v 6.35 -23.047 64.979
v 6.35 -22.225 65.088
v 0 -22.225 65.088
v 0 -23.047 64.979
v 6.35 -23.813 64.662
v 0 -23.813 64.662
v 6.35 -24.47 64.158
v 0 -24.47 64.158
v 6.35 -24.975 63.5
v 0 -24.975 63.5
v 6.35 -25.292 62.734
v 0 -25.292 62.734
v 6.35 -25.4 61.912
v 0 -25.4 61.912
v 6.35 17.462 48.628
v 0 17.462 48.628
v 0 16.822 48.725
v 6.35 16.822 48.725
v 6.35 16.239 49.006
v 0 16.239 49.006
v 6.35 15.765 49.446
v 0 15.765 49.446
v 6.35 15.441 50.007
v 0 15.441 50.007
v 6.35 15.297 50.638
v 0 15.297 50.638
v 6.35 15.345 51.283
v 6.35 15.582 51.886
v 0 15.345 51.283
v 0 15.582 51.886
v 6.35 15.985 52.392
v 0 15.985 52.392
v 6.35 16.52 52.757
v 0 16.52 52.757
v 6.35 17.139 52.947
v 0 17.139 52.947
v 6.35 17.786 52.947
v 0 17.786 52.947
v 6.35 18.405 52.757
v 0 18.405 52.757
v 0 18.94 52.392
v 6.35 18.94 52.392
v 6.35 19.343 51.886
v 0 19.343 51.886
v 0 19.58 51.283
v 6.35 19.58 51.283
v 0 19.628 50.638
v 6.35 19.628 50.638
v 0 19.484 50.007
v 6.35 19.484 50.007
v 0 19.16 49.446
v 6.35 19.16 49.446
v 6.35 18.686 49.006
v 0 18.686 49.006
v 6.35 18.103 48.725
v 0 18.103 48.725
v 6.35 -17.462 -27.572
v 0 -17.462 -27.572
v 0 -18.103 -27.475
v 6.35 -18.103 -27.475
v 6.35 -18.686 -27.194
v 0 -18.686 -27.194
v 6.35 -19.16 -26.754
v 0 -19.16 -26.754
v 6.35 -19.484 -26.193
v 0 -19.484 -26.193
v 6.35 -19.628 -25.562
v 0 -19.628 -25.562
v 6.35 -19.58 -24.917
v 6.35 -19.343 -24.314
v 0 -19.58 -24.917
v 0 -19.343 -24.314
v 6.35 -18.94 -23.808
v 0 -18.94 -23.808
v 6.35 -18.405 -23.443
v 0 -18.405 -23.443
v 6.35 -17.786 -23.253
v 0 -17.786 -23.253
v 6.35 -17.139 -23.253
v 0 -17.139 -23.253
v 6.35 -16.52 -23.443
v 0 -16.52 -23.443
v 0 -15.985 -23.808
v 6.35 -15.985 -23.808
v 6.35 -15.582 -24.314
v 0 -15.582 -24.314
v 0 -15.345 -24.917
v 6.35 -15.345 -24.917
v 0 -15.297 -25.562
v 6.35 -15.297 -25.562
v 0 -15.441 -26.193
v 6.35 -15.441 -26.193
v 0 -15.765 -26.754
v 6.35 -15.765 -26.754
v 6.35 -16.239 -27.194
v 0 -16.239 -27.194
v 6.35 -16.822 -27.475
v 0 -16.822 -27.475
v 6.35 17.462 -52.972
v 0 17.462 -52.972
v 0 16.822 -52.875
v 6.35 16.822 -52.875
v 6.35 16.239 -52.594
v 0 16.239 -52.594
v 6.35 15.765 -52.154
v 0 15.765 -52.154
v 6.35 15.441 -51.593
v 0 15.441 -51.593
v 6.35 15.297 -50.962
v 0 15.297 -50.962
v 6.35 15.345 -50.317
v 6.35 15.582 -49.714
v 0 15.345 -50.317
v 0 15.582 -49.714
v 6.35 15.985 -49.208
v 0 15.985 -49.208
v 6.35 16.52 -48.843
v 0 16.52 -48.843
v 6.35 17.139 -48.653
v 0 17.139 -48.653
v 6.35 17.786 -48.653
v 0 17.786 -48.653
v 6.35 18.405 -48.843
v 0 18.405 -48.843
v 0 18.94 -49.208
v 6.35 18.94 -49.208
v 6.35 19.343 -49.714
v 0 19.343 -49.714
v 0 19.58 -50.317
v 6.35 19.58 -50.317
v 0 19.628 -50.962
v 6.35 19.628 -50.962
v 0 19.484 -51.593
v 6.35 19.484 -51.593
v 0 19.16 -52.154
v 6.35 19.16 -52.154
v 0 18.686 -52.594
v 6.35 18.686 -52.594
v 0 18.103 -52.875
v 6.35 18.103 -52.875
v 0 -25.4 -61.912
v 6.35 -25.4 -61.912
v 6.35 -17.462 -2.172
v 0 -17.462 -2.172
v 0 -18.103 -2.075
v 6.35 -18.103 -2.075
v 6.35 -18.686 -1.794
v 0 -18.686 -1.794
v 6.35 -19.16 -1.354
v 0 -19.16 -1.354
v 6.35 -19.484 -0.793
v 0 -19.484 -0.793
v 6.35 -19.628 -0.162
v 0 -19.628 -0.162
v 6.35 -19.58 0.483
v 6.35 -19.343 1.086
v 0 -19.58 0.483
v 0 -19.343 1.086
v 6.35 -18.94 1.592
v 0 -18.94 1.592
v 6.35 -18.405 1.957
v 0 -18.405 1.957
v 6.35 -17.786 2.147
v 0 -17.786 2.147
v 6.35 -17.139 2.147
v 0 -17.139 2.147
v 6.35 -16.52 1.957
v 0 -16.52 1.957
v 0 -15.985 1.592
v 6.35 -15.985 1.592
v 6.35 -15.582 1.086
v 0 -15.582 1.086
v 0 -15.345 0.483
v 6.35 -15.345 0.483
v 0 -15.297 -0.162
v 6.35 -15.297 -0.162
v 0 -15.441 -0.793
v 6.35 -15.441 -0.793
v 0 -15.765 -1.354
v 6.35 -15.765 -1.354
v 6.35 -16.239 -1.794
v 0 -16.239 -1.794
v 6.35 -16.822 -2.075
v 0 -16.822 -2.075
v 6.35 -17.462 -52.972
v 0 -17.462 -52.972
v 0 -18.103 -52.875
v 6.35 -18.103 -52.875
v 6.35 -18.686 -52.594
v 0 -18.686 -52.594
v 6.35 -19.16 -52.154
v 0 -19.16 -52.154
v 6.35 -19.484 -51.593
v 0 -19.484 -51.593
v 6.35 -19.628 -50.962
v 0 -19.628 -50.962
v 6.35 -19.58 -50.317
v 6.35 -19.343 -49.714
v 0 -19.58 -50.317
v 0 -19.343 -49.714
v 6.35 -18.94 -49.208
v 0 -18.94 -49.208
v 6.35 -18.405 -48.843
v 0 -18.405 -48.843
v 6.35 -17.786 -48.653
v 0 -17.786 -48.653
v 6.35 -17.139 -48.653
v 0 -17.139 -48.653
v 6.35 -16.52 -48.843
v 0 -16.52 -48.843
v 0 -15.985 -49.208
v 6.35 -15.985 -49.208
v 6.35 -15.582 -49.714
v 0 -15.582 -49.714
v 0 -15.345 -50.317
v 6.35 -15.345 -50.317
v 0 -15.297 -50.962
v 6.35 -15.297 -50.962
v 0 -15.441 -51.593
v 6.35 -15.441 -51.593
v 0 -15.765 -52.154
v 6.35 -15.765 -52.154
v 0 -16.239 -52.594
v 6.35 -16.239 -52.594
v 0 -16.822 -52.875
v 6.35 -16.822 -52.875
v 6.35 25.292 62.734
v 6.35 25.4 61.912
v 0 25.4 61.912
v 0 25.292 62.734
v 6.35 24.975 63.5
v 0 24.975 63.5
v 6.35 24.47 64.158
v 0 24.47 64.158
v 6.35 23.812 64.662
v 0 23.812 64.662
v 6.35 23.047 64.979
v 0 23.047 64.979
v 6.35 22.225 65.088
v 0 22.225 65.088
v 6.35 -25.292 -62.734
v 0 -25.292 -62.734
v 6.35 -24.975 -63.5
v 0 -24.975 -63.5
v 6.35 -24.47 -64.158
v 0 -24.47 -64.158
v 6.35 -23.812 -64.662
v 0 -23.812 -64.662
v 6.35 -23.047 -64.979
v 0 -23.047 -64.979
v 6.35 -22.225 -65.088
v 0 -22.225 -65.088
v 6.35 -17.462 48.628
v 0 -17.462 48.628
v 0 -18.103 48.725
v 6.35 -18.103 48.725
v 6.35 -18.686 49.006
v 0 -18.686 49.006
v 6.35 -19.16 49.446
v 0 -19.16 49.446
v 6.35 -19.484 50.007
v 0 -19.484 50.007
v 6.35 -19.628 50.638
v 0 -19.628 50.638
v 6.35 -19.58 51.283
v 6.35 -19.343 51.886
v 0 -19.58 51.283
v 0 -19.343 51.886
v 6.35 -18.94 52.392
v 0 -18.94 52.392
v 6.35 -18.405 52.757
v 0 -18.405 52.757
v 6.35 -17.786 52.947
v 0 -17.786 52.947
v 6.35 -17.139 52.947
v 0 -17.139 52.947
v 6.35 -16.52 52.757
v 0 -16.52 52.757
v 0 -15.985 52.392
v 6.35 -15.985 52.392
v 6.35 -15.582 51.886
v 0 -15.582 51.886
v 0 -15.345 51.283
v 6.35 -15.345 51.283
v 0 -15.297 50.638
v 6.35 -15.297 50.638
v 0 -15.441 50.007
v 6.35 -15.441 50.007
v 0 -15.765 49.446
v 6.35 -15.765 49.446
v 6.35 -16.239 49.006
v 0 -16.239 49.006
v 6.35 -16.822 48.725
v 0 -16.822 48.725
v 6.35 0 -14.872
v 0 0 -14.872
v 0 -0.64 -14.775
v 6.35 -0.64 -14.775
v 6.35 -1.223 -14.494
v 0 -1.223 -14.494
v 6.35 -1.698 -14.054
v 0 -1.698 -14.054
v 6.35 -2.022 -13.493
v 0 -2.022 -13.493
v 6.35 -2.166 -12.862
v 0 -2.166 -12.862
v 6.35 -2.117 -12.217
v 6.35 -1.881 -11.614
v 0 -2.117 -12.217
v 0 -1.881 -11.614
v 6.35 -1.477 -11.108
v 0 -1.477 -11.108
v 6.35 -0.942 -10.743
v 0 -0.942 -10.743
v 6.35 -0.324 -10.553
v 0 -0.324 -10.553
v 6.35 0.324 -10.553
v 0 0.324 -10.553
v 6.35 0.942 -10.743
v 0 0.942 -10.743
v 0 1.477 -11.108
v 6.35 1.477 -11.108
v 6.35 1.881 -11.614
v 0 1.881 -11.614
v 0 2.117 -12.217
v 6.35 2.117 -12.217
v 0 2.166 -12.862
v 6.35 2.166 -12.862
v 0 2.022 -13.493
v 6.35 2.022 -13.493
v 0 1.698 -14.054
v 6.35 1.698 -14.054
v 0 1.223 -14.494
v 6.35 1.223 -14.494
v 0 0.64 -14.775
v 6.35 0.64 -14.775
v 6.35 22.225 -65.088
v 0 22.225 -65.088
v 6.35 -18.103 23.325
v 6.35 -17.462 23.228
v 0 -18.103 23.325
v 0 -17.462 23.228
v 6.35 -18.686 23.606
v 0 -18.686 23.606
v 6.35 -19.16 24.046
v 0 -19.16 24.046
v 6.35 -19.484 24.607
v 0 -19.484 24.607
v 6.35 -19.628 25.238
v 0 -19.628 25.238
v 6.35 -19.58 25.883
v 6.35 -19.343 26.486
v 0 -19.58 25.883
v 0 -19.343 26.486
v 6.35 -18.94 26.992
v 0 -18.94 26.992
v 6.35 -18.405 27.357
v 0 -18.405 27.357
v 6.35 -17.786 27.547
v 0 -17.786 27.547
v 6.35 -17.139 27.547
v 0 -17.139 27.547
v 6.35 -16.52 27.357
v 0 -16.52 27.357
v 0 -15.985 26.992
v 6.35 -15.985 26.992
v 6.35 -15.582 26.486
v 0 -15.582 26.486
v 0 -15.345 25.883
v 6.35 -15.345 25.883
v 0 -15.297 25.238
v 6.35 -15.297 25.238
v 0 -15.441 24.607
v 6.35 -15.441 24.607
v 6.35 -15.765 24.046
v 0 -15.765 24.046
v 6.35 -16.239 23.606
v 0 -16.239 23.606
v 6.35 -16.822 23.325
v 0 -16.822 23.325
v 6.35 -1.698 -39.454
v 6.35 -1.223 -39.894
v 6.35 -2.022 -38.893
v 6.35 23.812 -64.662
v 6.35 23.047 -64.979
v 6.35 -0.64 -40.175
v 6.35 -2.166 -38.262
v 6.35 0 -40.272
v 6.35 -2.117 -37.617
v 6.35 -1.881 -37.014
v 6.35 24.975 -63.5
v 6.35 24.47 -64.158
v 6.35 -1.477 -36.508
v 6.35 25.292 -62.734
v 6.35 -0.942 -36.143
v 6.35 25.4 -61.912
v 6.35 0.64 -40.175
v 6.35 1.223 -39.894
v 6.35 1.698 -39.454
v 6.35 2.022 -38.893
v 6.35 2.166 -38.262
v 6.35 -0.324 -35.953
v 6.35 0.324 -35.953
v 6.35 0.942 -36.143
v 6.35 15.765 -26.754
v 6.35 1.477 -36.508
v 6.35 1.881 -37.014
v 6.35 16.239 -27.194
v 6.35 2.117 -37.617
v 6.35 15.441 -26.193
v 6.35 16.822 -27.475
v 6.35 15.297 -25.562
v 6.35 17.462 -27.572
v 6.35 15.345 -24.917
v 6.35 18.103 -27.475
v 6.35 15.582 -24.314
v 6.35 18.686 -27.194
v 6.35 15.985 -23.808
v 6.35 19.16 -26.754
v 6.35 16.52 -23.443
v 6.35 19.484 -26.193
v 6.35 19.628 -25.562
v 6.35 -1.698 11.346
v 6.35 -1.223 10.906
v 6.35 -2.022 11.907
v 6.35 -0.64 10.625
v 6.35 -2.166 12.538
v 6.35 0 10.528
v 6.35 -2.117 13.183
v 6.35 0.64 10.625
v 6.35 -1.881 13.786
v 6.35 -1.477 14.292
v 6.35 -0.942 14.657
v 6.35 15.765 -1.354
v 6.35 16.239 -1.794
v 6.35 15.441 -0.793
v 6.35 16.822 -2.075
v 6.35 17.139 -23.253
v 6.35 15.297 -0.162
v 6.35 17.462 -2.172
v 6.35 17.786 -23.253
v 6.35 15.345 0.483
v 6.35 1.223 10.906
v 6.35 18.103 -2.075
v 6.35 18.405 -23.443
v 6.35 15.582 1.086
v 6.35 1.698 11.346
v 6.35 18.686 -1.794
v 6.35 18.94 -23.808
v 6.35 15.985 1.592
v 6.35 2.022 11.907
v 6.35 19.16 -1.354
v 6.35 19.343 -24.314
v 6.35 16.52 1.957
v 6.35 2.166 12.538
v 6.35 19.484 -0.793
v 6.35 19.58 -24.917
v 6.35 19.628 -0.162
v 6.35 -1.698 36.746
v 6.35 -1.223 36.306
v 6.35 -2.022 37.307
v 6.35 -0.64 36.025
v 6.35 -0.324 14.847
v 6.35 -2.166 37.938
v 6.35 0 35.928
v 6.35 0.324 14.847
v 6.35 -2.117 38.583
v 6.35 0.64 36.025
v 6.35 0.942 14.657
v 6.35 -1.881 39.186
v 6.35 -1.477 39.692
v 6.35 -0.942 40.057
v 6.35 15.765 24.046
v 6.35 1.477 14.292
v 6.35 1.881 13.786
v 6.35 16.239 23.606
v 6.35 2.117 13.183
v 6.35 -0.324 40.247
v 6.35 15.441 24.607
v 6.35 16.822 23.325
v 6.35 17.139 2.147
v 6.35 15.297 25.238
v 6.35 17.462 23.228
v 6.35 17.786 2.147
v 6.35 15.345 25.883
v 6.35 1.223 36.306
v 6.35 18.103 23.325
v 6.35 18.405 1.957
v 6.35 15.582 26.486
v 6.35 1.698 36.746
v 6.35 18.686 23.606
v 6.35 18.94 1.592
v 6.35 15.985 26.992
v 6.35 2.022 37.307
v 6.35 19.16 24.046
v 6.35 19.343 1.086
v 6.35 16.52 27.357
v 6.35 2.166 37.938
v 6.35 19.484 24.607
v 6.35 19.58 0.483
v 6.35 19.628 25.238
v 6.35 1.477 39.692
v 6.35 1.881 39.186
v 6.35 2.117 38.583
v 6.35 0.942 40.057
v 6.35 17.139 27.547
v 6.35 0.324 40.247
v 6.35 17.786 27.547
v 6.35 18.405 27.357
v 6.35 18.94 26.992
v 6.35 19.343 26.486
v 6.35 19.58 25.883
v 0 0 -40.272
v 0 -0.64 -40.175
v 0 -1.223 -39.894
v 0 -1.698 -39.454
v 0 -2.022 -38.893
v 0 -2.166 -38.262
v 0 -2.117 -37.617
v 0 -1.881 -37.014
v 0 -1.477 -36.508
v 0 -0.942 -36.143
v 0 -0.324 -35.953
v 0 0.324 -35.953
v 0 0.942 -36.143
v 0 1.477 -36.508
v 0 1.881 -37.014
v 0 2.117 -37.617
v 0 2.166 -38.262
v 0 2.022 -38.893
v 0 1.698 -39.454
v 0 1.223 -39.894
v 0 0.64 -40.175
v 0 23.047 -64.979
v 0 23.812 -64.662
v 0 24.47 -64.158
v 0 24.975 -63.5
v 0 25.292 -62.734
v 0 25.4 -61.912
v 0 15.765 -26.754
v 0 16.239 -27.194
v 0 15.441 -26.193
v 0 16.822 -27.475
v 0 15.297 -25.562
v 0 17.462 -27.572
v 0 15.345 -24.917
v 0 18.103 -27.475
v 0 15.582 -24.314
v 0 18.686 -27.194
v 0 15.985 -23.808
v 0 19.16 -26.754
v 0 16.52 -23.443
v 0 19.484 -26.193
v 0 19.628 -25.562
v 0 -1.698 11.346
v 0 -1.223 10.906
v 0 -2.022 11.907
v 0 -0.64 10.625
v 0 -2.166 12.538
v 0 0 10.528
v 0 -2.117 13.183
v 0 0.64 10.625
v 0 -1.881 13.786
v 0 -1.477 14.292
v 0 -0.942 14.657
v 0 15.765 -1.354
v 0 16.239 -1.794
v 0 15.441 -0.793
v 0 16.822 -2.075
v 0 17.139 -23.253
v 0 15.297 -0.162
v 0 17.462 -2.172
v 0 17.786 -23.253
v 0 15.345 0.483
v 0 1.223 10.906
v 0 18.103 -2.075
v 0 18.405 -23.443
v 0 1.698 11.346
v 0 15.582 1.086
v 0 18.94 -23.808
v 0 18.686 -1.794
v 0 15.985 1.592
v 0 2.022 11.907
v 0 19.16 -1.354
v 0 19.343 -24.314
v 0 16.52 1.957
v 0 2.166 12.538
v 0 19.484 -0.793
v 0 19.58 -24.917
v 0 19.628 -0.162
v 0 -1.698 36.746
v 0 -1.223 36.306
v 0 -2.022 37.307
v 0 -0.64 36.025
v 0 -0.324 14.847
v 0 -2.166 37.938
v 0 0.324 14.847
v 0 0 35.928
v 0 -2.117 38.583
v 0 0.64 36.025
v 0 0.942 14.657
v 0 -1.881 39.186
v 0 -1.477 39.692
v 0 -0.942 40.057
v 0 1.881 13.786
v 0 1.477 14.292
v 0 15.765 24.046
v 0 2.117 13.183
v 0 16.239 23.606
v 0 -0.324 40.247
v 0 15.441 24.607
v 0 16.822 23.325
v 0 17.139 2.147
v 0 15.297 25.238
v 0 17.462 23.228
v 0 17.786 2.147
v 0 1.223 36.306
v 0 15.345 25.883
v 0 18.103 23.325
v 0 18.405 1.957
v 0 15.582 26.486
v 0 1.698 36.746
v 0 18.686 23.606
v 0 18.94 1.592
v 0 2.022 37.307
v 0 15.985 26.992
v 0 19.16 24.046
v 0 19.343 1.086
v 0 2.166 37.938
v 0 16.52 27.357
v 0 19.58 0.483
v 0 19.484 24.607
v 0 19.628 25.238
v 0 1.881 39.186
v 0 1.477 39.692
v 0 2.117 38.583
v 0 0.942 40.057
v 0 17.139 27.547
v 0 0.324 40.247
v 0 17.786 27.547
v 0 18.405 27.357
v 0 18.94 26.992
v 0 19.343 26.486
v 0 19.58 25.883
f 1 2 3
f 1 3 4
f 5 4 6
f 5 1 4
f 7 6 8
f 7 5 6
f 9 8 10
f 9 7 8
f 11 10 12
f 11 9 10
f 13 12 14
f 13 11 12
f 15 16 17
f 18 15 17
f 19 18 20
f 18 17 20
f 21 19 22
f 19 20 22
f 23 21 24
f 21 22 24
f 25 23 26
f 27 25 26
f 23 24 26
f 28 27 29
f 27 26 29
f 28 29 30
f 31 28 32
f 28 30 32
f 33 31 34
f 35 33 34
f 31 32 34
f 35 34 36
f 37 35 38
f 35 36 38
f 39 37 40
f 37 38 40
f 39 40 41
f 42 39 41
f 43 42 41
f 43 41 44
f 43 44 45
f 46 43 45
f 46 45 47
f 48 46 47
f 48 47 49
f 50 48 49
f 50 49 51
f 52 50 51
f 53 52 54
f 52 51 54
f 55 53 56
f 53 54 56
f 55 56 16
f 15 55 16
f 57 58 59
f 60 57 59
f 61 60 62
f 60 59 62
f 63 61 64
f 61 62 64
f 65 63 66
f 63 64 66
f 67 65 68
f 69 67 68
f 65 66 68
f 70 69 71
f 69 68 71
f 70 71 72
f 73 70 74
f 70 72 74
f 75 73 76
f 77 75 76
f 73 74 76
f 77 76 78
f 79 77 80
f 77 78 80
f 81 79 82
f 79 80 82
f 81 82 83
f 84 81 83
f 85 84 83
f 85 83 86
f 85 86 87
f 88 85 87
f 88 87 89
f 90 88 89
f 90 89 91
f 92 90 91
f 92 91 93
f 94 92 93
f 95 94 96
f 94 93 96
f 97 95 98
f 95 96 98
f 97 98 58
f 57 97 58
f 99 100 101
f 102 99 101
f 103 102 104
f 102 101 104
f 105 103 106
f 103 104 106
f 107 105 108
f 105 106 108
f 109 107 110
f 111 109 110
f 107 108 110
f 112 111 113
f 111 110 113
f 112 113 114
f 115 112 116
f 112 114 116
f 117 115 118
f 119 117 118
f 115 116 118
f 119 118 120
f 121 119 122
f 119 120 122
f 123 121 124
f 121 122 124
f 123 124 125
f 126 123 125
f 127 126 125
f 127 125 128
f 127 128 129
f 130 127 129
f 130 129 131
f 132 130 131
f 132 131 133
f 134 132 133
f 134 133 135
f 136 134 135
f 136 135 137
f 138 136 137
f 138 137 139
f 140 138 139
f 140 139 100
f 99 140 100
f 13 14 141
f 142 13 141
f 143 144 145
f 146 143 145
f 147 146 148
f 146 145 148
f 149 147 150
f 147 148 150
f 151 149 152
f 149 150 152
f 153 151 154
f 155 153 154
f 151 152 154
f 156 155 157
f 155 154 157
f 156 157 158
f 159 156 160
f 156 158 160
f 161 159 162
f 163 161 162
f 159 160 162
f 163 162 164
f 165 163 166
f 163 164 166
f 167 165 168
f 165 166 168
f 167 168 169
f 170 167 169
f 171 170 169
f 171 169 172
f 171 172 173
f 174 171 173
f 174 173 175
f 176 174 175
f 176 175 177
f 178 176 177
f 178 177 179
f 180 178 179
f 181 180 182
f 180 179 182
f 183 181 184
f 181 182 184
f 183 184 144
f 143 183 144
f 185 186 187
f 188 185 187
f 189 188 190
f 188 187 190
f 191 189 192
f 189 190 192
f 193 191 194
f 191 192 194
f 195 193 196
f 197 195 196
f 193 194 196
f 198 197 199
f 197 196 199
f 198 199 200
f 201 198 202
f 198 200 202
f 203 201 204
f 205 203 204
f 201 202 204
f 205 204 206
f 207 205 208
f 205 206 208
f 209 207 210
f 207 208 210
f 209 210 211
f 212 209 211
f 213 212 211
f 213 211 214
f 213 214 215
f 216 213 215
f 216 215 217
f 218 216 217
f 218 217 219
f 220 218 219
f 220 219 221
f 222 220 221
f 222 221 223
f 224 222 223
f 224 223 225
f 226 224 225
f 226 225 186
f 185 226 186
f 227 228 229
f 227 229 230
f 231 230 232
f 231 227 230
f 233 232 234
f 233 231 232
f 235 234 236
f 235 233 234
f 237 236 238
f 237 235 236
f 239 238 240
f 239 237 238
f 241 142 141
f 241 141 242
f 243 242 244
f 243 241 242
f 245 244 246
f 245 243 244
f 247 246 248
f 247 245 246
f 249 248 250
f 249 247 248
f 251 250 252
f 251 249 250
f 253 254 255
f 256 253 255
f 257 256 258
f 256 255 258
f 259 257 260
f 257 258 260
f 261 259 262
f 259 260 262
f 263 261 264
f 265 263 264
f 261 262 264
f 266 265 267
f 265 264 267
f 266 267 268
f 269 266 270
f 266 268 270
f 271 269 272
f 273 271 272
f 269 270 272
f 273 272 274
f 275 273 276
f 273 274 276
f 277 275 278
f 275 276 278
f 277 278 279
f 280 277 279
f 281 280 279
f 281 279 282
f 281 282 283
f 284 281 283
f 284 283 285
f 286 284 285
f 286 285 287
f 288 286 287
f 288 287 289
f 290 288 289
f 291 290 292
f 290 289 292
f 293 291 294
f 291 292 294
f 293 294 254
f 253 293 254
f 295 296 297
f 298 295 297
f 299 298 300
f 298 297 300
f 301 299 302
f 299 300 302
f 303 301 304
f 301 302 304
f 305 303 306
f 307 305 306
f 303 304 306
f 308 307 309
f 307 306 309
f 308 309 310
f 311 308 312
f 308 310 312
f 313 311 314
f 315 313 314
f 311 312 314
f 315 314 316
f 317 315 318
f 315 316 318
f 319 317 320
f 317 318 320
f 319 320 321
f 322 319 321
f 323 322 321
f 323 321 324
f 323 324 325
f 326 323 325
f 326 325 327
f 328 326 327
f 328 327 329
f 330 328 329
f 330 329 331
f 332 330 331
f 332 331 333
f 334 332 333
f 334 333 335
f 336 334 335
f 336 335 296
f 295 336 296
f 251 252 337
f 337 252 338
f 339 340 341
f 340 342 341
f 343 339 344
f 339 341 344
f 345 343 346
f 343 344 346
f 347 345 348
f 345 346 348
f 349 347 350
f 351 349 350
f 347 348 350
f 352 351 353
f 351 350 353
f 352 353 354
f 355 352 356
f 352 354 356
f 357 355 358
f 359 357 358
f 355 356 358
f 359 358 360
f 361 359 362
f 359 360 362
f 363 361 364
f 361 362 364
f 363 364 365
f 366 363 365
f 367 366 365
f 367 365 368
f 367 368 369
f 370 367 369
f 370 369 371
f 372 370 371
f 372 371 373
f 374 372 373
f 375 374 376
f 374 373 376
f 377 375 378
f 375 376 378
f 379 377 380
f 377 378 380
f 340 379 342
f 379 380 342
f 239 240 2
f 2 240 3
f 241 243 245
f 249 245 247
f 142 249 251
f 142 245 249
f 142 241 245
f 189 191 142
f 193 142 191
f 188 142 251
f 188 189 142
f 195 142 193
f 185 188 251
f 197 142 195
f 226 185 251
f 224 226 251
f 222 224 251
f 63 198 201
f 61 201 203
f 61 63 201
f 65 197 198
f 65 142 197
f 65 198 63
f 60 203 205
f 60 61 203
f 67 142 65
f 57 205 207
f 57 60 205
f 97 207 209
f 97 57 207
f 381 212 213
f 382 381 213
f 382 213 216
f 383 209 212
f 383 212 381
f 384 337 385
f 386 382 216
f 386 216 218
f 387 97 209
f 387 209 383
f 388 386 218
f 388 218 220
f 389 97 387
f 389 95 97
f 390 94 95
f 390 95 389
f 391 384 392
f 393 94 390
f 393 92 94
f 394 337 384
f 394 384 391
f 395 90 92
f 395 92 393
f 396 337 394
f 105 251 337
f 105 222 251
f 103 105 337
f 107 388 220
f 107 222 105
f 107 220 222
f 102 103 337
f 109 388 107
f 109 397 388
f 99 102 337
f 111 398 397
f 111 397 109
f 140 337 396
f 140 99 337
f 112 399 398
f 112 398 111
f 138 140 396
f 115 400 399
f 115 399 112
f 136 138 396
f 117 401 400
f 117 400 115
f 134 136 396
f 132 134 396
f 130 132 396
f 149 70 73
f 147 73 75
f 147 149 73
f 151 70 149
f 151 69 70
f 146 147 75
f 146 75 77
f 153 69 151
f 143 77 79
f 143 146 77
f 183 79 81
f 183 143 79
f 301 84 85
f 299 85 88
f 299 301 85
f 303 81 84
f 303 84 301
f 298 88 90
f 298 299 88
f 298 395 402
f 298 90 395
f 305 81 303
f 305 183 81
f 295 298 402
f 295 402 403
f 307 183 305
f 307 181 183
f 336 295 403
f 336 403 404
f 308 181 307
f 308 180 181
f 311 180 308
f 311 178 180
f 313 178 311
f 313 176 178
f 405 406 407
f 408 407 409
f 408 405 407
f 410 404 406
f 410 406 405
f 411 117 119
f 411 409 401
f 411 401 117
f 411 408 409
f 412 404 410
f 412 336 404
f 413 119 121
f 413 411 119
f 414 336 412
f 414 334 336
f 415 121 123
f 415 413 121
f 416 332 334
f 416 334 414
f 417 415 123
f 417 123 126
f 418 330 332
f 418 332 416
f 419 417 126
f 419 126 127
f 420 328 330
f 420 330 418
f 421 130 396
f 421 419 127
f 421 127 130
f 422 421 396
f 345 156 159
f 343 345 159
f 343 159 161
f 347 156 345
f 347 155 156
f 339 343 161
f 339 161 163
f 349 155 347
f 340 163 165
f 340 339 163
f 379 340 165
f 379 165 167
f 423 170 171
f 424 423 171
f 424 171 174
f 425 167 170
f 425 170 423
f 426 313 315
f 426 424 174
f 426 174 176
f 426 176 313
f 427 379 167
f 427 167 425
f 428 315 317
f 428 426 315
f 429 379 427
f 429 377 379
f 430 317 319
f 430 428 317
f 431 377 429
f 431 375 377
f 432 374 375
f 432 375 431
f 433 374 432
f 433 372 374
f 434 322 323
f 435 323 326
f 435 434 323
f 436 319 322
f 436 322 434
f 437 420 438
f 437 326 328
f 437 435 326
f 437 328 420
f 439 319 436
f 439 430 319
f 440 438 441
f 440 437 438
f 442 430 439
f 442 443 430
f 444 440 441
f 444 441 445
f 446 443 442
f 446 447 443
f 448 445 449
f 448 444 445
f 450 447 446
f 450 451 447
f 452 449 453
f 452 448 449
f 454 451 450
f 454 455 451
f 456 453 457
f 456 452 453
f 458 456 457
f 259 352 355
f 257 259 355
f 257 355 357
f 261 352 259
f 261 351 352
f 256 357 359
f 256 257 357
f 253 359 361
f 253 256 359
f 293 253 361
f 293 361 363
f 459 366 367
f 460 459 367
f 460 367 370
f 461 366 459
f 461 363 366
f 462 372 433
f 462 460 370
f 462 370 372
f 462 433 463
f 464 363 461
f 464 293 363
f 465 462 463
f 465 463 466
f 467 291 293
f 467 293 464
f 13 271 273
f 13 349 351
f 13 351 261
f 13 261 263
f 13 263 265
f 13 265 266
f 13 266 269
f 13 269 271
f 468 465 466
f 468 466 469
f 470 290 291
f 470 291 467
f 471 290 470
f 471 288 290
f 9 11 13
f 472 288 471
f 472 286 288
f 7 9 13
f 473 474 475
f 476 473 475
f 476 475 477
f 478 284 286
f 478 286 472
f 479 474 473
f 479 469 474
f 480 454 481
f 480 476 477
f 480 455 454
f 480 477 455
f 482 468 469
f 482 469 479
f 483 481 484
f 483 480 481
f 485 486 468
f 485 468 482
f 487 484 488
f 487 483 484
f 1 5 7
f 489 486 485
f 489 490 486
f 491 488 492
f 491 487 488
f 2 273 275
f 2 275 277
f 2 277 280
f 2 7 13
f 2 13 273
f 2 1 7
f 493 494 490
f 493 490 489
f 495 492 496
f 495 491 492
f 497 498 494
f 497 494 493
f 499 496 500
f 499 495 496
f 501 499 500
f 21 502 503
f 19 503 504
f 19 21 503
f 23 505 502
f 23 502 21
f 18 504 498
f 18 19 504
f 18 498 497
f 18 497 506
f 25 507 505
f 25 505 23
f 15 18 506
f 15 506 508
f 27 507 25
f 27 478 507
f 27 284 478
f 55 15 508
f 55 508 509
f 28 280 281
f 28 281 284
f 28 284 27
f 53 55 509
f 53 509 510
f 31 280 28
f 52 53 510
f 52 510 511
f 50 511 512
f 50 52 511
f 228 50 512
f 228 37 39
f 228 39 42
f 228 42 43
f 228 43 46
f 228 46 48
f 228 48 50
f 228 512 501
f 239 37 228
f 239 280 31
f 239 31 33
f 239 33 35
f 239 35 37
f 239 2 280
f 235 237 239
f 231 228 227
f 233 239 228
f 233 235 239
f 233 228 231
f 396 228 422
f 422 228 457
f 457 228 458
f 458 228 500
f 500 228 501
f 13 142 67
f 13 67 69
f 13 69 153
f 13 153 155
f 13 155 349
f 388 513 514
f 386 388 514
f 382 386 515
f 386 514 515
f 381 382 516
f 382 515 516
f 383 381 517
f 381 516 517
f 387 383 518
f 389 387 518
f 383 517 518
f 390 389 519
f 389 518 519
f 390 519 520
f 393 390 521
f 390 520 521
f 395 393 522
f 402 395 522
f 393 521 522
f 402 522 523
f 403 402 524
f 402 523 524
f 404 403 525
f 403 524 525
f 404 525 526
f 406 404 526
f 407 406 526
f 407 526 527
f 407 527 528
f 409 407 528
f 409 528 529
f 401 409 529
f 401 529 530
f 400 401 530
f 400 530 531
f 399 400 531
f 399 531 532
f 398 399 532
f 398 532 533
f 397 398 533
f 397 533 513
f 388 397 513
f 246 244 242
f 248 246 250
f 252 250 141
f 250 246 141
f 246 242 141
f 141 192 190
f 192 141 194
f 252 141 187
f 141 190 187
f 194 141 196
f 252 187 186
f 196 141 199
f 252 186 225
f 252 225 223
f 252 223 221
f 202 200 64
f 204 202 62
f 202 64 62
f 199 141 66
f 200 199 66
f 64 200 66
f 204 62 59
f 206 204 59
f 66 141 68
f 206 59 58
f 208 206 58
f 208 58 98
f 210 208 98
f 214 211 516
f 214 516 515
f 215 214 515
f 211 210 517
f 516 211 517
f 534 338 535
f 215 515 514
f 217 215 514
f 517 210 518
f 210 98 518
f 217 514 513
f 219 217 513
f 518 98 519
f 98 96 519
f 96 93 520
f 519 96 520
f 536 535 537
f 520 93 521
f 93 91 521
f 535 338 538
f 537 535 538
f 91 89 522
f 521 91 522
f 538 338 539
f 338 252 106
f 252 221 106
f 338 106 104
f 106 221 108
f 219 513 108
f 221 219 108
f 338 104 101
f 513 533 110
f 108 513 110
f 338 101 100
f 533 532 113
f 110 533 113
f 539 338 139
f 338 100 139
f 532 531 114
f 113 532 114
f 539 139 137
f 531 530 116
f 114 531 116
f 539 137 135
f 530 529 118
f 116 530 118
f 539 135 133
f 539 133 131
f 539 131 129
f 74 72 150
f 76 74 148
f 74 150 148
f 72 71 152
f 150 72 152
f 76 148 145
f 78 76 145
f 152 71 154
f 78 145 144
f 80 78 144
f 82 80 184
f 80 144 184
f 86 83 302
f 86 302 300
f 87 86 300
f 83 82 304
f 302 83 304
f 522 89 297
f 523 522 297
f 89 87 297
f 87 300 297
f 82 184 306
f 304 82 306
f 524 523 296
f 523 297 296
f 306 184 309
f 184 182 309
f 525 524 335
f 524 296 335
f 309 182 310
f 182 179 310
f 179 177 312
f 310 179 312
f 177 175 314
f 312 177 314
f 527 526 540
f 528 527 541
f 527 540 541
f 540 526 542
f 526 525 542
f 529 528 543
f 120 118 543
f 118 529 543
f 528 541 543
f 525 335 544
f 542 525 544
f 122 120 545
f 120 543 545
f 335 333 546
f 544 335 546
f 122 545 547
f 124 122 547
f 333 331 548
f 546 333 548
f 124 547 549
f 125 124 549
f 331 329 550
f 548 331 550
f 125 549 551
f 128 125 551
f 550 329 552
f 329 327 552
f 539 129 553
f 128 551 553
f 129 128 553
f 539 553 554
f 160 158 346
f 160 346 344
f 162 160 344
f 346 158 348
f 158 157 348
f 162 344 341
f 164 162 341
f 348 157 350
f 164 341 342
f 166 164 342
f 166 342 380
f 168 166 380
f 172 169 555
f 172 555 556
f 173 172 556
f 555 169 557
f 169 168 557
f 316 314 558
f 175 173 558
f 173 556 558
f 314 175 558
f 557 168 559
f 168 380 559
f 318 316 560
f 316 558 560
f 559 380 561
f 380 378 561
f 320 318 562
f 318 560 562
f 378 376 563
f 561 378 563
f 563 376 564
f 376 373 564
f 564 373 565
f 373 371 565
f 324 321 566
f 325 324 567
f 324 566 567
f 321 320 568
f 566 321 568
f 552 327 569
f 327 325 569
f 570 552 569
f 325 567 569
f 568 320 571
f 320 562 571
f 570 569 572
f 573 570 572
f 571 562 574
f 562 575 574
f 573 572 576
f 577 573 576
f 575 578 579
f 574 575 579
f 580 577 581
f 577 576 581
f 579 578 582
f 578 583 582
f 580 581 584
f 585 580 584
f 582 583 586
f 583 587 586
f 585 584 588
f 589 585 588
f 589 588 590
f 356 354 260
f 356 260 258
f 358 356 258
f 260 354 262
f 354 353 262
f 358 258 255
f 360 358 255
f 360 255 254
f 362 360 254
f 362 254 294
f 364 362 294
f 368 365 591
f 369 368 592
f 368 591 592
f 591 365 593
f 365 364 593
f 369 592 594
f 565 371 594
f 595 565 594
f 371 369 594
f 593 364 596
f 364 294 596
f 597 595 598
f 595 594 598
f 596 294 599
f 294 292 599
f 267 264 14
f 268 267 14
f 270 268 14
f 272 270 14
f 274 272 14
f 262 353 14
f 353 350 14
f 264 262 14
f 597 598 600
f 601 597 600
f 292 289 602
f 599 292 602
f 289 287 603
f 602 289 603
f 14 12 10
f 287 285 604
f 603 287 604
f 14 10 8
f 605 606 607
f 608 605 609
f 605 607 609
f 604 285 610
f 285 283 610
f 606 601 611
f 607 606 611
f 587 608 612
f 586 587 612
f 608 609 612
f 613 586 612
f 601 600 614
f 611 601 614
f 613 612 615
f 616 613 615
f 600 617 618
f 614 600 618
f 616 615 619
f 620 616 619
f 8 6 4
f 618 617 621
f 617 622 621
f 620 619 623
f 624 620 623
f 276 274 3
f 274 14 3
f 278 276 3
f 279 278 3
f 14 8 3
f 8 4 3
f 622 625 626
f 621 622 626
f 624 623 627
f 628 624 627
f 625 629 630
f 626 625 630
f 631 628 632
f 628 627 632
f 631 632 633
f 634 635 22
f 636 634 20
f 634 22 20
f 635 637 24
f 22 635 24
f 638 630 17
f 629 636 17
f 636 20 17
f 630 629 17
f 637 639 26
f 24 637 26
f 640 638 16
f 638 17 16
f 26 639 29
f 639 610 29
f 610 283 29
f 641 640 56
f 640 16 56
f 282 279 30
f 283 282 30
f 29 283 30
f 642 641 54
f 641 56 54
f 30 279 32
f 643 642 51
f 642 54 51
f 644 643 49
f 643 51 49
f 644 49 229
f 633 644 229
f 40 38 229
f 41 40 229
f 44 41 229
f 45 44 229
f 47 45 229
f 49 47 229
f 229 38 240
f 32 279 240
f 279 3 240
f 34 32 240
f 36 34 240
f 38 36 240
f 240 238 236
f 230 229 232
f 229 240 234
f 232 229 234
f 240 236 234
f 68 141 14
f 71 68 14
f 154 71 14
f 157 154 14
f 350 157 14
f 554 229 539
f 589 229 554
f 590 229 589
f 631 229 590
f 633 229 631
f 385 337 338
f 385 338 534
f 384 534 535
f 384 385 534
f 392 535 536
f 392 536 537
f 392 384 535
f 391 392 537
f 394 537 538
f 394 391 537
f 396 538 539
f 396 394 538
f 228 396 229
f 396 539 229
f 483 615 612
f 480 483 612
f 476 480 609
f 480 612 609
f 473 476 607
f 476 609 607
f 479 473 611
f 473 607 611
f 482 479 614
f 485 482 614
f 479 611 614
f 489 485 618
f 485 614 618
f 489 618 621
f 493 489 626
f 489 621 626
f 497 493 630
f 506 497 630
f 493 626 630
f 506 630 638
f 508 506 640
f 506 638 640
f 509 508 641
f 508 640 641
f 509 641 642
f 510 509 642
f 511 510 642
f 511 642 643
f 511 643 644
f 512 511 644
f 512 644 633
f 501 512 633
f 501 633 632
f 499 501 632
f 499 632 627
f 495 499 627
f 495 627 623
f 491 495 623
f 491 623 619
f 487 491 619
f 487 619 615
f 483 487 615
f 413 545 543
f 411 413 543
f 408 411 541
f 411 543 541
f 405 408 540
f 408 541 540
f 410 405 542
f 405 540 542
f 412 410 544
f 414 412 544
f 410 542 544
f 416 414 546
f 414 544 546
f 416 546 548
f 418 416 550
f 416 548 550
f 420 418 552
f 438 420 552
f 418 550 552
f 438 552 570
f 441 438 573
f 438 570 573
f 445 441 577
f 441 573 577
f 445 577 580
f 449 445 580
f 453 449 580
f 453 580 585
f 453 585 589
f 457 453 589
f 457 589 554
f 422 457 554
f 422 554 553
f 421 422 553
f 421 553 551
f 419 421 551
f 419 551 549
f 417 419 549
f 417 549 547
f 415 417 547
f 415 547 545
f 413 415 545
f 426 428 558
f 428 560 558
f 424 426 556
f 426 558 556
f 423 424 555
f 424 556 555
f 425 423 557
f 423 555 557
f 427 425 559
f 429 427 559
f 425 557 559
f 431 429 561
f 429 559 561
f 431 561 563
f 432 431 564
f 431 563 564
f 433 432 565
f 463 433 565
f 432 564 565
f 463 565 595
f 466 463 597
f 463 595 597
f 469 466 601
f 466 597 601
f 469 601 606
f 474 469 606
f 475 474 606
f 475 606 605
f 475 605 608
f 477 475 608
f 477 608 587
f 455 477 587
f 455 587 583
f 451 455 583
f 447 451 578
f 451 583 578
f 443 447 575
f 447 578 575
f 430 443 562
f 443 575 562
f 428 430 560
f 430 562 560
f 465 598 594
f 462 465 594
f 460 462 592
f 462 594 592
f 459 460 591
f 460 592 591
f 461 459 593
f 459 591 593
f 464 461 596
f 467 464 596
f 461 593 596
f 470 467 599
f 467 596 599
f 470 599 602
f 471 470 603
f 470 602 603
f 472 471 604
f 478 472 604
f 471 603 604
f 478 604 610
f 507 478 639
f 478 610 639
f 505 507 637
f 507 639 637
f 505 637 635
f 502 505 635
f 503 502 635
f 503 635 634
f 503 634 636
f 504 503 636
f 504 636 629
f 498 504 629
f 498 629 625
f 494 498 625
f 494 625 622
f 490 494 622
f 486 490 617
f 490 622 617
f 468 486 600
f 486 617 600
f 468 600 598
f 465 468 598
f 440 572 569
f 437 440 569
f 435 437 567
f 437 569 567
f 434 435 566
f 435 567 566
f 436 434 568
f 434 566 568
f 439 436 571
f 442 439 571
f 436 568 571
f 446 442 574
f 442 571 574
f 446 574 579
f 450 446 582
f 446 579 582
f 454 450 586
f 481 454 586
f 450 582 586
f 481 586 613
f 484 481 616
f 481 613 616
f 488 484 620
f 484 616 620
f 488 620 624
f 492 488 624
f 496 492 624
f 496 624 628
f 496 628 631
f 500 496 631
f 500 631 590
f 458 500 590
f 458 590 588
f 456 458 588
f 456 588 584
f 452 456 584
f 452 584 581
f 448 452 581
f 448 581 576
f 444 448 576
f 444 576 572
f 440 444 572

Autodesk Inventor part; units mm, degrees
ref_plane "YZ Plane" through (0, 0, 0) normal (1, 0, 0) x (0, 1, 0)
ref_plane "XZ Plane" through (0, 0, 0) normal (0, 1, 0) x (-1, 0, 0)
ref_plane "XY Plane" through (0, 0, 0) normal (0, 0, 1) x (1, 0, 0)
sketch "Sketch1" plane through (0, 0, 0) normal (1, 0, 0) x (0, 1, 0)
  line L0 (-25.4, -65.0875) -> (25.4, -65.0875)
  line L1 (25.4, -65.0875) -> (25.4, 65.0875)
  line L2 (25.4, 65.0875) -> (-25.4, 65.0875)
  line L3 (-25.4, 65.0875) -> (-25.4, -65.0875)
  line L4 (-25.4, -65.0875) -> (25.4, 65.0875) construction
  line L5 (25.4, -65.0875) -> (-25.4, 65.0875) construction
  point P0 (0, 0)
  dimension "d0" = 130.175
  dimension "d1" = 50.8
extrude "Extrusion1" add sketch "Sketch1" along normal blind 6.35
sketch "Sketch2" plane through (6.35, 0, 0) normal (1, 0, 0) x (0, 0, -1)
  line L0 (-50.8, 17.4625) -> (-50.8, -17.4625) construction
  line L1 (-65.0875, 25.4) -> (-65.0875, -25.4) construction
  line L2 (65.0875, 25.4) -> (65.0875, -25.4) construction
  line L3 (65.0875, -25.4) -> (-65.0875, -25.4) construction
  line L4 (-65.0875, 25.4) -> (65.0875, 25.4) construction
  line L5 (-65.0875, -25.4) -> (-65.0875, 25.4) projected
  point P0 (0, 0)
  point P1 (-38.1, 0)
  point P2 (-50.8, 0)
  point P3 (-65.0875, 0)
  point P4 (-25.4, 17.4625)
  point P5 (-12.7, 0)
  point P6 (-25.4, -17.4625)
  point P7 (0, 17.4625)
  point P8 (12.7, 0)
  point P9 (0, -17.4625)
  point P10 (25.4, 17.4625)
  point P11 (38.1, 0)
  point P12 (25.4, -17.4625)
  point P13 (50.8, 17.4625)
  point P14 (63.5, 0)
  point P15 (50.8, -17.4625)
  dimension "d6" = 34.925
  dimension "d7" = 14.2875
  dimension "d8" = 12.7
  dimension "d11" = 25.4
hole "Hole1" at (6.35, -17.4625, 50.8) at (6.35, 17.4625, 50.8) at (6.35, 0, 38.1) at (6.35, 17.4625, 25.4) at (6.35, 0, 12.7) at (6.35, -17.4625, 25.4) at (6.35, 17.4625, 0) at (6.35, 0, -12.7) at (6.35, -17.4625, 0) at (6.35, 17.4625, -25.4) at (6.35, -17.4625, -25.4) at (6.35, 0, -38.1) at (6.35, 17.4625, -50.8) at (6.35, -17.4625, -50.8) direction (-1, 0, 0) diameter 4.3434 end through all thread size "12-24 UNC" class "2B" standard "ANSI Unified Screw Threads"
fillet "Fillet1" radius 3.175 4 edges at (3.175, 25.4, 65.0875) (3.175, 25.4, -65.0875) (3.175, -25.4, -65.0875) (3.175, -25.4, 65.0875)
properties part number "CL4-021" material "Aluminum 6061"
